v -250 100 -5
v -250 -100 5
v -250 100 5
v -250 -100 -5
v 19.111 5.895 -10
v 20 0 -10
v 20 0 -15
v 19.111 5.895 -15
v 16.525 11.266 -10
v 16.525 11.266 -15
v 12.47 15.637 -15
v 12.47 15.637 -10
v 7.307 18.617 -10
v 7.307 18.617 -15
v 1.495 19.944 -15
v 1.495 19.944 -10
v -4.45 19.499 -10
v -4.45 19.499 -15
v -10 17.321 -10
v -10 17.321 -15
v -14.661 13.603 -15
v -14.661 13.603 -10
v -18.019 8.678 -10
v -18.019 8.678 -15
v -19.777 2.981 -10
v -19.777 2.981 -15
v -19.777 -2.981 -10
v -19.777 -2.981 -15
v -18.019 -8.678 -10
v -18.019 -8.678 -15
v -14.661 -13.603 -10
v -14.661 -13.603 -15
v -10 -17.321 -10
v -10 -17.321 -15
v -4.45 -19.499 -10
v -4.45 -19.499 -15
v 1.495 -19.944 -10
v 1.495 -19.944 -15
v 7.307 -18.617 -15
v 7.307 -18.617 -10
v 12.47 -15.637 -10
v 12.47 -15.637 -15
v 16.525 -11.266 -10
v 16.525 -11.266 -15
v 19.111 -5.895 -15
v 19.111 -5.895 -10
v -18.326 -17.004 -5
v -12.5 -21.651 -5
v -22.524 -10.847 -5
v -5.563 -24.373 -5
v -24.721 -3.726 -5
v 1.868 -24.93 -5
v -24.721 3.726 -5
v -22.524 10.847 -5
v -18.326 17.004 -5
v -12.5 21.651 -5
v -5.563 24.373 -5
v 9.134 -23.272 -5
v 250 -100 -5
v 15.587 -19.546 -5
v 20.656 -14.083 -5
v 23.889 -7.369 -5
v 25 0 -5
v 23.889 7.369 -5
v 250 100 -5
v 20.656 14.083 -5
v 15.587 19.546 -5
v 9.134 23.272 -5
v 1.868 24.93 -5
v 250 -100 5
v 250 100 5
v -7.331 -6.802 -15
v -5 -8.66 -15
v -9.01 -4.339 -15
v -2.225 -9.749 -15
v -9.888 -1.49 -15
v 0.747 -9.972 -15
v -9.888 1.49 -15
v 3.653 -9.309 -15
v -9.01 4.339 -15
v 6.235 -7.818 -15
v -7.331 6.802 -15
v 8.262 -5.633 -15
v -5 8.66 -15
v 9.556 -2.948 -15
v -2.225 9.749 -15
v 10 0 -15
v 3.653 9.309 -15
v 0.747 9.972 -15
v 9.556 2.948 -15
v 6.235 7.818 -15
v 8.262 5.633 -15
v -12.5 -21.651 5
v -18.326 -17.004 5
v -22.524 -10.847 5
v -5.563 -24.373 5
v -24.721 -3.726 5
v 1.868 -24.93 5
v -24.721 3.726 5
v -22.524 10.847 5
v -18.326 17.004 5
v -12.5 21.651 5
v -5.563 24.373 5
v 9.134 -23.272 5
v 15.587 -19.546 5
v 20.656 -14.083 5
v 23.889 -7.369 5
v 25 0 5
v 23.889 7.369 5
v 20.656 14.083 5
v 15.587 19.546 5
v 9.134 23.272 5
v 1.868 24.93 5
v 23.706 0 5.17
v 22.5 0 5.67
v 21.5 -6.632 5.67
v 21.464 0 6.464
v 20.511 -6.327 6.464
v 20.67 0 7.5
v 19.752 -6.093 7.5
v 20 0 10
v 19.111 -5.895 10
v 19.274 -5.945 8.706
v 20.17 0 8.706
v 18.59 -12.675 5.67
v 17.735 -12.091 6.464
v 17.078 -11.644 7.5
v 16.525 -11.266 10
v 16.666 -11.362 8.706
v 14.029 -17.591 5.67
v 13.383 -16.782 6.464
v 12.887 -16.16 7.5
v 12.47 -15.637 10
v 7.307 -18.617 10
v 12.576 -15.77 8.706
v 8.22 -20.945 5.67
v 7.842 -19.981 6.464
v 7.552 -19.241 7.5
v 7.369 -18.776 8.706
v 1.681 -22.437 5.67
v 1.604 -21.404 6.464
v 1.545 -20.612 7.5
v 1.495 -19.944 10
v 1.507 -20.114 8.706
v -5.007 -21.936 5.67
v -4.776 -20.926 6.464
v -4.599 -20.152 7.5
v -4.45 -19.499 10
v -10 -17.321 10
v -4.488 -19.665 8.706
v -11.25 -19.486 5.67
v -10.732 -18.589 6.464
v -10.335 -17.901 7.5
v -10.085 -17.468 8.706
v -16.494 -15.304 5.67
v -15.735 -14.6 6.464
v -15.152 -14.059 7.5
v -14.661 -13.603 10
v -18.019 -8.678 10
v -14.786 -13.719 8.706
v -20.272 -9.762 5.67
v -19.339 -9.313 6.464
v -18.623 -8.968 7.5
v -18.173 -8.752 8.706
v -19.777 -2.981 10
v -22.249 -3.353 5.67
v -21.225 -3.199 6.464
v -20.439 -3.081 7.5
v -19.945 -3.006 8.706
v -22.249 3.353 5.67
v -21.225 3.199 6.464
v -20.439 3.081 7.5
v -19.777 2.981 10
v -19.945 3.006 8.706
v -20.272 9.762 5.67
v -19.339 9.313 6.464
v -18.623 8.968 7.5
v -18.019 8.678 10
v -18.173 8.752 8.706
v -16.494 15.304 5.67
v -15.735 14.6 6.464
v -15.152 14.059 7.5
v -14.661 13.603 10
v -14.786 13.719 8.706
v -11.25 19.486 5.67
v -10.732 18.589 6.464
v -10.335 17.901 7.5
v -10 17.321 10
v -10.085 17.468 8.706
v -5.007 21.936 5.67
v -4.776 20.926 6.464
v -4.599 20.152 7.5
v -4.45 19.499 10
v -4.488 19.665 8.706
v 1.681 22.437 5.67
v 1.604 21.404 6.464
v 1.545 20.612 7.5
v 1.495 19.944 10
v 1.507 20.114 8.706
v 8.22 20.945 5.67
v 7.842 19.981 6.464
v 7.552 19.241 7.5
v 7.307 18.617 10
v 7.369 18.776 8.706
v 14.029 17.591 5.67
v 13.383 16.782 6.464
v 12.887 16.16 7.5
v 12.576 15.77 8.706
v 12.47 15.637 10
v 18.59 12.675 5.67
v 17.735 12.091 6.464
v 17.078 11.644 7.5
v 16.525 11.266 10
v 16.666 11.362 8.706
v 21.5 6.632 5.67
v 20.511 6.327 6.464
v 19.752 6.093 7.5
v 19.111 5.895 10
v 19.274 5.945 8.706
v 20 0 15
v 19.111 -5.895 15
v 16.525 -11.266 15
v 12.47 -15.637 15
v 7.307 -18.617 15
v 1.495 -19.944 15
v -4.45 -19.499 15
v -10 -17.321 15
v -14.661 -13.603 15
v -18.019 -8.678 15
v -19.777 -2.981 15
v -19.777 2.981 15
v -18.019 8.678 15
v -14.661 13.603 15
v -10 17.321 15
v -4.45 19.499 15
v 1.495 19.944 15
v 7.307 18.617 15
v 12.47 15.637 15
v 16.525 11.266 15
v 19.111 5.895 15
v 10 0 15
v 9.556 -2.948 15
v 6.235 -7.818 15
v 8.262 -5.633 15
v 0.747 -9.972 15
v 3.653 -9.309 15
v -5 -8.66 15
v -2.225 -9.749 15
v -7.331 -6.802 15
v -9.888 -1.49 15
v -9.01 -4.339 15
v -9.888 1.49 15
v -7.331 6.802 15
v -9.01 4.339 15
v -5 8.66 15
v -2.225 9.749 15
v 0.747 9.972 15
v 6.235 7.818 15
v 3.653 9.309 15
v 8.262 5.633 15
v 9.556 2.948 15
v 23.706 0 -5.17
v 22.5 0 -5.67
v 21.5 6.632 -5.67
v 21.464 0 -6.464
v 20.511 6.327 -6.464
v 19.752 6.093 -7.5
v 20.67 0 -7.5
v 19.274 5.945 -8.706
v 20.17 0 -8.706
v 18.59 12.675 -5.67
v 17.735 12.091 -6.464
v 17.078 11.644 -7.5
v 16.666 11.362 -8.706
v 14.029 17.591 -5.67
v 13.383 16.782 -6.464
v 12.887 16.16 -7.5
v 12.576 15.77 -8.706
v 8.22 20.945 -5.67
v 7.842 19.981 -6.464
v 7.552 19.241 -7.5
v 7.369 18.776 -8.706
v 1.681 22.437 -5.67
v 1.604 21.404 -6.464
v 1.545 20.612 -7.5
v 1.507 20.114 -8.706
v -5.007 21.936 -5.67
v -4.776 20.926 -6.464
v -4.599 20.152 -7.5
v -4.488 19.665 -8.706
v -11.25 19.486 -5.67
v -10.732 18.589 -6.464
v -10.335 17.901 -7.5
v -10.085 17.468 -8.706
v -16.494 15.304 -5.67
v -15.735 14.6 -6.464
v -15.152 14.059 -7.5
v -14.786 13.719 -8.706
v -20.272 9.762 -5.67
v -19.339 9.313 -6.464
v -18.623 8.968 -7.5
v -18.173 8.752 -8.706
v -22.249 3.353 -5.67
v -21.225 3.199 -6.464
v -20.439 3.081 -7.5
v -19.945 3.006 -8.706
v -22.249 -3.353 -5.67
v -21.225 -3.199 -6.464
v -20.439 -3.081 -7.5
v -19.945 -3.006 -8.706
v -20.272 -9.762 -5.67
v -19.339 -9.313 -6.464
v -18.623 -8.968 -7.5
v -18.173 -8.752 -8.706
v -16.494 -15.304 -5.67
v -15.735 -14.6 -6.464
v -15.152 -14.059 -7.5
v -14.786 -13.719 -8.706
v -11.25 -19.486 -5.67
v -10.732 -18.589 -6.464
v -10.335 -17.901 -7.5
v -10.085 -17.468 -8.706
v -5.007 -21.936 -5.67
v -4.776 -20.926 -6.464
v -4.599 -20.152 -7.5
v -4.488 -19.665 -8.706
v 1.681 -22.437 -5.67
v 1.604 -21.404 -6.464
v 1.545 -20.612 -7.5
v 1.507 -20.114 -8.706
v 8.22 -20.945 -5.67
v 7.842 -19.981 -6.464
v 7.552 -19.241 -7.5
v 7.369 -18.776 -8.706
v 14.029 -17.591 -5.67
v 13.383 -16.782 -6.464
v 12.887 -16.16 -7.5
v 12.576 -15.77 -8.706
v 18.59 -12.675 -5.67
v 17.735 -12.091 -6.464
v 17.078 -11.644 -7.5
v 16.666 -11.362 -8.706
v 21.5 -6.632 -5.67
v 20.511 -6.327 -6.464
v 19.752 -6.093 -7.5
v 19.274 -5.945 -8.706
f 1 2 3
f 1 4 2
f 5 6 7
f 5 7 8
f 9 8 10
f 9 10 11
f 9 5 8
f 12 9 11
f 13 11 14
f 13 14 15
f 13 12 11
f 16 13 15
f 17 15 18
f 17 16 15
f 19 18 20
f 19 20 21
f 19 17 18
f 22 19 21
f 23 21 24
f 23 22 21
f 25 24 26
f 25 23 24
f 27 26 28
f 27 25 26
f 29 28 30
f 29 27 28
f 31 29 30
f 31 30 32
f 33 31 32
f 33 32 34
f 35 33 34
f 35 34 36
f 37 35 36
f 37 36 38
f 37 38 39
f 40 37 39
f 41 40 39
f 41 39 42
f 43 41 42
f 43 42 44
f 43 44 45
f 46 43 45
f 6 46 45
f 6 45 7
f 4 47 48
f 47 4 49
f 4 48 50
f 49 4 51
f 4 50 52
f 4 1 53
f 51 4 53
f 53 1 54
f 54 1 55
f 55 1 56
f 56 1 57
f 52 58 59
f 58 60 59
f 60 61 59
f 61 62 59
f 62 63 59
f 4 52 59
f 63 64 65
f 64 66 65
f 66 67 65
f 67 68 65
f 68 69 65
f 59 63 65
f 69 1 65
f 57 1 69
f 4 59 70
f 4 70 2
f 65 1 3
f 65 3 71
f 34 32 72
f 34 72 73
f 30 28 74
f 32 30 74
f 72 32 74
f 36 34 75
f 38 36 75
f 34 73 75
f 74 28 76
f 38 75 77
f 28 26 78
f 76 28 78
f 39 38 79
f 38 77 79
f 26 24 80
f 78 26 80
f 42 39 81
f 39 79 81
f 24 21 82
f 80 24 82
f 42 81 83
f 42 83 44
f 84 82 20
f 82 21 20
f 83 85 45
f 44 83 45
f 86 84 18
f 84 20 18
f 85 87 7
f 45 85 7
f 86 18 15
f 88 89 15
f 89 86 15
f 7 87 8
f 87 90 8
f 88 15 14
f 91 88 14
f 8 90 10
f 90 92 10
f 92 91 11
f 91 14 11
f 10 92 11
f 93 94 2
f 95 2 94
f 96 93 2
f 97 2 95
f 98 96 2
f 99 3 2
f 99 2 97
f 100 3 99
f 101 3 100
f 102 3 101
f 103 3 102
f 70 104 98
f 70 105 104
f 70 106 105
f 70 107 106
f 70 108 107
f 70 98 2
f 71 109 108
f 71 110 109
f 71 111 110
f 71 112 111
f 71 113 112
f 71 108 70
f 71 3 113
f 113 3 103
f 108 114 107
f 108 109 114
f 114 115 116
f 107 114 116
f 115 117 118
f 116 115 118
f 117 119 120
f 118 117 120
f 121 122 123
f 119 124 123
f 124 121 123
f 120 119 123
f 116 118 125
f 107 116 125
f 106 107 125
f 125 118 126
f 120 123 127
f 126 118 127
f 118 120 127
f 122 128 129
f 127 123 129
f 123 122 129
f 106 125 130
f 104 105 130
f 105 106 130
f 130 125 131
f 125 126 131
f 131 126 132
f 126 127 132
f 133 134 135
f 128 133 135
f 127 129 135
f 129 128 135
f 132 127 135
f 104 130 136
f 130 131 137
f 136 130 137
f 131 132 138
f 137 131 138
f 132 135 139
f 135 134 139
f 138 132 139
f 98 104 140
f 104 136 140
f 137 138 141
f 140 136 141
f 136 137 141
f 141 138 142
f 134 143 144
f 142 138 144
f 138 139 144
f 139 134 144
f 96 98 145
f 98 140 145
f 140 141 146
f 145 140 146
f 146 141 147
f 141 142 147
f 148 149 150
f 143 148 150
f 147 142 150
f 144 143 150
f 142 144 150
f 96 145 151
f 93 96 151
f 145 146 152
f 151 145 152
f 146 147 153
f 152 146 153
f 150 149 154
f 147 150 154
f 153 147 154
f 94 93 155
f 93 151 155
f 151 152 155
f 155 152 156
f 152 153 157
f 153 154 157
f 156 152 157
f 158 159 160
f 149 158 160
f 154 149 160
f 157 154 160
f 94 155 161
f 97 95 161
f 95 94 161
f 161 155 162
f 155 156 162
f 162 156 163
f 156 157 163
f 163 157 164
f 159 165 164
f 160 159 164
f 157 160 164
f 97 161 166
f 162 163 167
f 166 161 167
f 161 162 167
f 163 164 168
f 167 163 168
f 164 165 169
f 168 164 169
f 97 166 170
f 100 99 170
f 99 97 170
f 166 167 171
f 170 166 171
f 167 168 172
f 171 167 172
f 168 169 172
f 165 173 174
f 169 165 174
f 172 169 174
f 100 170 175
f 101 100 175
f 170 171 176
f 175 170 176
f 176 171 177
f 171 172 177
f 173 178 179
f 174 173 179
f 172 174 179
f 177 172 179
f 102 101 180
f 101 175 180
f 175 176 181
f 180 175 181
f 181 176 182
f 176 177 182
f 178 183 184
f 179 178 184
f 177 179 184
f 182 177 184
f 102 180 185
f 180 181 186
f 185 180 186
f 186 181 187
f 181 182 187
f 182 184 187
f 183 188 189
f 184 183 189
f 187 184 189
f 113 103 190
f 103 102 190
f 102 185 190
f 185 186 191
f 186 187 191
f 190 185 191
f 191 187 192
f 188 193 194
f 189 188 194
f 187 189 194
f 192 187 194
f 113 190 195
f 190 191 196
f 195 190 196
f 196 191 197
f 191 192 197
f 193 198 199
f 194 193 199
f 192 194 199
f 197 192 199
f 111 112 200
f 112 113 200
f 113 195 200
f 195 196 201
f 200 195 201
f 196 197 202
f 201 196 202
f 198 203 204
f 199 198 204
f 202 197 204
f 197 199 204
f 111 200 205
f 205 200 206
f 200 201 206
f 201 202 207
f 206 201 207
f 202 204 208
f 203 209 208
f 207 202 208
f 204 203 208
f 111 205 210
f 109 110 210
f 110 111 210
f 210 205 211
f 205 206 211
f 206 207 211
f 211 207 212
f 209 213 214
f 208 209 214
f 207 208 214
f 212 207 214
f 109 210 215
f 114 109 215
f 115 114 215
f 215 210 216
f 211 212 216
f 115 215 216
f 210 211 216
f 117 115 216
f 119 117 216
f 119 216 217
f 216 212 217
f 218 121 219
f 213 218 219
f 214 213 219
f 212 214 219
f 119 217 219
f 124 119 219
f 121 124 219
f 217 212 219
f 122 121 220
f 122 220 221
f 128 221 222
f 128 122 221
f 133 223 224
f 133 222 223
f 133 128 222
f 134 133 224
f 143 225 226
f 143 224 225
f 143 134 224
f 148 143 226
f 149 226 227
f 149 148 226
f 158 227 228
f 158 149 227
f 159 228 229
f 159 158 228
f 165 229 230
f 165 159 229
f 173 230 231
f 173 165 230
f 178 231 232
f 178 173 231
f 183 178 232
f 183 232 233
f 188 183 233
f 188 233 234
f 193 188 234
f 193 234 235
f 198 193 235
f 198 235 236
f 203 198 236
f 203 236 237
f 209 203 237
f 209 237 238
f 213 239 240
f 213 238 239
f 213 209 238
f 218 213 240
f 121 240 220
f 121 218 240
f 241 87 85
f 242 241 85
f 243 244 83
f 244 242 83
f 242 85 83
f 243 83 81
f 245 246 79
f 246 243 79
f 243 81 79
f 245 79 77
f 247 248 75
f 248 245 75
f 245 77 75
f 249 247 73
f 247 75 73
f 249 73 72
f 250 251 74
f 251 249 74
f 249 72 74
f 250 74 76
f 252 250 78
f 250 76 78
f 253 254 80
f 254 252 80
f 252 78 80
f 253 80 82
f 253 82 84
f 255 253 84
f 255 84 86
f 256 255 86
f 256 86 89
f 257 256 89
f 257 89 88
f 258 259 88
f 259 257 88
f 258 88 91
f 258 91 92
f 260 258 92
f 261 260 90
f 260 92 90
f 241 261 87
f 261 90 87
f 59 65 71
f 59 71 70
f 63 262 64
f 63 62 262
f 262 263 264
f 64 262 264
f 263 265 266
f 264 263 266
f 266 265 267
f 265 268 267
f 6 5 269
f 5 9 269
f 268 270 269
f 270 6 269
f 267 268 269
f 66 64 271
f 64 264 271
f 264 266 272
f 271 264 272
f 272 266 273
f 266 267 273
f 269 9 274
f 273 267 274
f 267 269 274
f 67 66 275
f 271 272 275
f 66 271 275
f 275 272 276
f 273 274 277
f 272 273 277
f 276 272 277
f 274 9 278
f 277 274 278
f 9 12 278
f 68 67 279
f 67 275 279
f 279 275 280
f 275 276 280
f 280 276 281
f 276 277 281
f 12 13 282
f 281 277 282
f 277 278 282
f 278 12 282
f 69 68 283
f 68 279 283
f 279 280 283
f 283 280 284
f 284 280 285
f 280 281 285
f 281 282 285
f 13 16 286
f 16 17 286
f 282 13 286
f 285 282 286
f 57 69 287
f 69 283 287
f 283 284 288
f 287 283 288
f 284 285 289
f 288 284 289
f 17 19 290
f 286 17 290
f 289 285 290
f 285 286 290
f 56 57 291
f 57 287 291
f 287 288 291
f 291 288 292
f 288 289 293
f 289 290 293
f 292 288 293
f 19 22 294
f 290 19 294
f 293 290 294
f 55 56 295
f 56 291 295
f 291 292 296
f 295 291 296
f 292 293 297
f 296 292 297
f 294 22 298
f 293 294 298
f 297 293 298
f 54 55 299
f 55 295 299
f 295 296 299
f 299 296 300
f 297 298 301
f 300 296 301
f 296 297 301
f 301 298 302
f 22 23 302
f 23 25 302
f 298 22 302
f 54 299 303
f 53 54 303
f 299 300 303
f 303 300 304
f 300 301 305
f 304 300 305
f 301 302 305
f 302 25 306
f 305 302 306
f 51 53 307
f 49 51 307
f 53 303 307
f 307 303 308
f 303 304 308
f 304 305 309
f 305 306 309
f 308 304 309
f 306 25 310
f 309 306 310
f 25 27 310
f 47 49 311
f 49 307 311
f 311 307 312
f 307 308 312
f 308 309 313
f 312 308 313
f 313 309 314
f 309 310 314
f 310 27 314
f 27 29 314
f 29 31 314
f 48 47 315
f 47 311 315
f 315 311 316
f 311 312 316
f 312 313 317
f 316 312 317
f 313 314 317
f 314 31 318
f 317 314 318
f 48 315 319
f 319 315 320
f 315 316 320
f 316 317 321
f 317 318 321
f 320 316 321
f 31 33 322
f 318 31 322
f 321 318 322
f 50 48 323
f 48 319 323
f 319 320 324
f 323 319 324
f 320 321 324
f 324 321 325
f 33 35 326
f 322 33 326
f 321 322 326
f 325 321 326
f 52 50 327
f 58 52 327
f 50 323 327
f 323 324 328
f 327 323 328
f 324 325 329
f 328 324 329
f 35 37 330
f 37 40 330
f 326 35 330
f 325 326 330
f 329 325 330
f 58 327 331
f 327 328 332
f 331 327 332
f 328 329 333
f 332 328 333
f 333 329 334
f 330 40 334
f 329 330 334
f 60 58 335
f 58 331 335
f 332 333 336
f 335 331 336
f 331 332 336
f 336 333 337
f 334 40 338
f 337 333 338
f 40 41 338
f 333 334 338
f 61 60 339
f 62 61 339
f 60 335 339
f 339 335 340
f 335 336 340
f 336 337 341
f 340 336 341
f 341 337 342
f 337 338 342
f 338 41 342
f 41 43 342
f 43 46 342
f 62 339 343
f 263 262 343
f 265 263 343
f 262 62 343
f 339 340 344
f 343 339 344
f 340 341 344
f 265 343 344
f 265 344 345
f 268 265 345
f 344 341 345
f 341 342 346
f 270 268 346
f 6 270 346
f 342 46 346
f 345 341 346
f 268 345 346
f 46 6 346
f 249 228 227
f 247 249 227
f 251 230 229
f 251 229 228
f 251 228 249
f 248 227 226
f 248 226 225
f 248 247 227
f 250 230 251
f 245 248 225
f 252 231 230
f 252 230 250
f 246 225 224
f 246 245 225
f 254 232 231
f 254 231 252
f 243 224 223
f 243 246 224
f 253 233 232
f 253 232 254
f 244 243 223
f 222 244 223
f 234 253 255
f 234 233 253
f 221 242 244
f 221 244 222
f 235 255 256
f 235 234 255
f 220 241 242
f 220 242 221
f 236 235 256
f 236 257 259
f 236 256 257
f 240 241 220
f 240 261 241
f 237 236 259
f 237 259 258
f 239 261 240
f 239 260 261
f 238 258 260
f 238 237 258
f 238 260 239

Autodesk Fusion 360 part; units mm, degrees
sketch "Sketch1" plane through (0, 0, 0) normal (0, 0, 1) x (1, 0, 0)
  line L0 (-250, 100) -> (250, 100)
  line L1 (250, 100) -> (250, -100)
  line L2 (250, -100) -> (-250, -100)
  line L3 (-250, -100) -> (-250, 100)
  line L4 (0, 100) -> (0, -100) construction
  line L5 (-250, 0) -> (250, 0) construction
  circle A0 centre (0, 0) radius 20
  circle A1 centre (0, 0) radius 10
  dimension "Total_Height" = 200
  dimension "Total_Width" = 500
  dimension "Inner_Radius" = 10
  dimension "Outer_Radius" = 20
extrude "Extrude1" add sketch "Sketch1" along normal mid plane 10 contours L0 L1 L2 L3
extrude "Extrude2" add sketch "Sketch1" along normal mid plane 30 contours A0
fillet "Fillet1" radius 5 2 edges at (-18.6465, 7.2323, 5) (-18.6465, -7.2323, -5)
equation "Plate_Thickness = 1 cm"
equation "Shoulder_Thickness = 3 cm"
equation "Fillet_Radius = 0.5 cm"
